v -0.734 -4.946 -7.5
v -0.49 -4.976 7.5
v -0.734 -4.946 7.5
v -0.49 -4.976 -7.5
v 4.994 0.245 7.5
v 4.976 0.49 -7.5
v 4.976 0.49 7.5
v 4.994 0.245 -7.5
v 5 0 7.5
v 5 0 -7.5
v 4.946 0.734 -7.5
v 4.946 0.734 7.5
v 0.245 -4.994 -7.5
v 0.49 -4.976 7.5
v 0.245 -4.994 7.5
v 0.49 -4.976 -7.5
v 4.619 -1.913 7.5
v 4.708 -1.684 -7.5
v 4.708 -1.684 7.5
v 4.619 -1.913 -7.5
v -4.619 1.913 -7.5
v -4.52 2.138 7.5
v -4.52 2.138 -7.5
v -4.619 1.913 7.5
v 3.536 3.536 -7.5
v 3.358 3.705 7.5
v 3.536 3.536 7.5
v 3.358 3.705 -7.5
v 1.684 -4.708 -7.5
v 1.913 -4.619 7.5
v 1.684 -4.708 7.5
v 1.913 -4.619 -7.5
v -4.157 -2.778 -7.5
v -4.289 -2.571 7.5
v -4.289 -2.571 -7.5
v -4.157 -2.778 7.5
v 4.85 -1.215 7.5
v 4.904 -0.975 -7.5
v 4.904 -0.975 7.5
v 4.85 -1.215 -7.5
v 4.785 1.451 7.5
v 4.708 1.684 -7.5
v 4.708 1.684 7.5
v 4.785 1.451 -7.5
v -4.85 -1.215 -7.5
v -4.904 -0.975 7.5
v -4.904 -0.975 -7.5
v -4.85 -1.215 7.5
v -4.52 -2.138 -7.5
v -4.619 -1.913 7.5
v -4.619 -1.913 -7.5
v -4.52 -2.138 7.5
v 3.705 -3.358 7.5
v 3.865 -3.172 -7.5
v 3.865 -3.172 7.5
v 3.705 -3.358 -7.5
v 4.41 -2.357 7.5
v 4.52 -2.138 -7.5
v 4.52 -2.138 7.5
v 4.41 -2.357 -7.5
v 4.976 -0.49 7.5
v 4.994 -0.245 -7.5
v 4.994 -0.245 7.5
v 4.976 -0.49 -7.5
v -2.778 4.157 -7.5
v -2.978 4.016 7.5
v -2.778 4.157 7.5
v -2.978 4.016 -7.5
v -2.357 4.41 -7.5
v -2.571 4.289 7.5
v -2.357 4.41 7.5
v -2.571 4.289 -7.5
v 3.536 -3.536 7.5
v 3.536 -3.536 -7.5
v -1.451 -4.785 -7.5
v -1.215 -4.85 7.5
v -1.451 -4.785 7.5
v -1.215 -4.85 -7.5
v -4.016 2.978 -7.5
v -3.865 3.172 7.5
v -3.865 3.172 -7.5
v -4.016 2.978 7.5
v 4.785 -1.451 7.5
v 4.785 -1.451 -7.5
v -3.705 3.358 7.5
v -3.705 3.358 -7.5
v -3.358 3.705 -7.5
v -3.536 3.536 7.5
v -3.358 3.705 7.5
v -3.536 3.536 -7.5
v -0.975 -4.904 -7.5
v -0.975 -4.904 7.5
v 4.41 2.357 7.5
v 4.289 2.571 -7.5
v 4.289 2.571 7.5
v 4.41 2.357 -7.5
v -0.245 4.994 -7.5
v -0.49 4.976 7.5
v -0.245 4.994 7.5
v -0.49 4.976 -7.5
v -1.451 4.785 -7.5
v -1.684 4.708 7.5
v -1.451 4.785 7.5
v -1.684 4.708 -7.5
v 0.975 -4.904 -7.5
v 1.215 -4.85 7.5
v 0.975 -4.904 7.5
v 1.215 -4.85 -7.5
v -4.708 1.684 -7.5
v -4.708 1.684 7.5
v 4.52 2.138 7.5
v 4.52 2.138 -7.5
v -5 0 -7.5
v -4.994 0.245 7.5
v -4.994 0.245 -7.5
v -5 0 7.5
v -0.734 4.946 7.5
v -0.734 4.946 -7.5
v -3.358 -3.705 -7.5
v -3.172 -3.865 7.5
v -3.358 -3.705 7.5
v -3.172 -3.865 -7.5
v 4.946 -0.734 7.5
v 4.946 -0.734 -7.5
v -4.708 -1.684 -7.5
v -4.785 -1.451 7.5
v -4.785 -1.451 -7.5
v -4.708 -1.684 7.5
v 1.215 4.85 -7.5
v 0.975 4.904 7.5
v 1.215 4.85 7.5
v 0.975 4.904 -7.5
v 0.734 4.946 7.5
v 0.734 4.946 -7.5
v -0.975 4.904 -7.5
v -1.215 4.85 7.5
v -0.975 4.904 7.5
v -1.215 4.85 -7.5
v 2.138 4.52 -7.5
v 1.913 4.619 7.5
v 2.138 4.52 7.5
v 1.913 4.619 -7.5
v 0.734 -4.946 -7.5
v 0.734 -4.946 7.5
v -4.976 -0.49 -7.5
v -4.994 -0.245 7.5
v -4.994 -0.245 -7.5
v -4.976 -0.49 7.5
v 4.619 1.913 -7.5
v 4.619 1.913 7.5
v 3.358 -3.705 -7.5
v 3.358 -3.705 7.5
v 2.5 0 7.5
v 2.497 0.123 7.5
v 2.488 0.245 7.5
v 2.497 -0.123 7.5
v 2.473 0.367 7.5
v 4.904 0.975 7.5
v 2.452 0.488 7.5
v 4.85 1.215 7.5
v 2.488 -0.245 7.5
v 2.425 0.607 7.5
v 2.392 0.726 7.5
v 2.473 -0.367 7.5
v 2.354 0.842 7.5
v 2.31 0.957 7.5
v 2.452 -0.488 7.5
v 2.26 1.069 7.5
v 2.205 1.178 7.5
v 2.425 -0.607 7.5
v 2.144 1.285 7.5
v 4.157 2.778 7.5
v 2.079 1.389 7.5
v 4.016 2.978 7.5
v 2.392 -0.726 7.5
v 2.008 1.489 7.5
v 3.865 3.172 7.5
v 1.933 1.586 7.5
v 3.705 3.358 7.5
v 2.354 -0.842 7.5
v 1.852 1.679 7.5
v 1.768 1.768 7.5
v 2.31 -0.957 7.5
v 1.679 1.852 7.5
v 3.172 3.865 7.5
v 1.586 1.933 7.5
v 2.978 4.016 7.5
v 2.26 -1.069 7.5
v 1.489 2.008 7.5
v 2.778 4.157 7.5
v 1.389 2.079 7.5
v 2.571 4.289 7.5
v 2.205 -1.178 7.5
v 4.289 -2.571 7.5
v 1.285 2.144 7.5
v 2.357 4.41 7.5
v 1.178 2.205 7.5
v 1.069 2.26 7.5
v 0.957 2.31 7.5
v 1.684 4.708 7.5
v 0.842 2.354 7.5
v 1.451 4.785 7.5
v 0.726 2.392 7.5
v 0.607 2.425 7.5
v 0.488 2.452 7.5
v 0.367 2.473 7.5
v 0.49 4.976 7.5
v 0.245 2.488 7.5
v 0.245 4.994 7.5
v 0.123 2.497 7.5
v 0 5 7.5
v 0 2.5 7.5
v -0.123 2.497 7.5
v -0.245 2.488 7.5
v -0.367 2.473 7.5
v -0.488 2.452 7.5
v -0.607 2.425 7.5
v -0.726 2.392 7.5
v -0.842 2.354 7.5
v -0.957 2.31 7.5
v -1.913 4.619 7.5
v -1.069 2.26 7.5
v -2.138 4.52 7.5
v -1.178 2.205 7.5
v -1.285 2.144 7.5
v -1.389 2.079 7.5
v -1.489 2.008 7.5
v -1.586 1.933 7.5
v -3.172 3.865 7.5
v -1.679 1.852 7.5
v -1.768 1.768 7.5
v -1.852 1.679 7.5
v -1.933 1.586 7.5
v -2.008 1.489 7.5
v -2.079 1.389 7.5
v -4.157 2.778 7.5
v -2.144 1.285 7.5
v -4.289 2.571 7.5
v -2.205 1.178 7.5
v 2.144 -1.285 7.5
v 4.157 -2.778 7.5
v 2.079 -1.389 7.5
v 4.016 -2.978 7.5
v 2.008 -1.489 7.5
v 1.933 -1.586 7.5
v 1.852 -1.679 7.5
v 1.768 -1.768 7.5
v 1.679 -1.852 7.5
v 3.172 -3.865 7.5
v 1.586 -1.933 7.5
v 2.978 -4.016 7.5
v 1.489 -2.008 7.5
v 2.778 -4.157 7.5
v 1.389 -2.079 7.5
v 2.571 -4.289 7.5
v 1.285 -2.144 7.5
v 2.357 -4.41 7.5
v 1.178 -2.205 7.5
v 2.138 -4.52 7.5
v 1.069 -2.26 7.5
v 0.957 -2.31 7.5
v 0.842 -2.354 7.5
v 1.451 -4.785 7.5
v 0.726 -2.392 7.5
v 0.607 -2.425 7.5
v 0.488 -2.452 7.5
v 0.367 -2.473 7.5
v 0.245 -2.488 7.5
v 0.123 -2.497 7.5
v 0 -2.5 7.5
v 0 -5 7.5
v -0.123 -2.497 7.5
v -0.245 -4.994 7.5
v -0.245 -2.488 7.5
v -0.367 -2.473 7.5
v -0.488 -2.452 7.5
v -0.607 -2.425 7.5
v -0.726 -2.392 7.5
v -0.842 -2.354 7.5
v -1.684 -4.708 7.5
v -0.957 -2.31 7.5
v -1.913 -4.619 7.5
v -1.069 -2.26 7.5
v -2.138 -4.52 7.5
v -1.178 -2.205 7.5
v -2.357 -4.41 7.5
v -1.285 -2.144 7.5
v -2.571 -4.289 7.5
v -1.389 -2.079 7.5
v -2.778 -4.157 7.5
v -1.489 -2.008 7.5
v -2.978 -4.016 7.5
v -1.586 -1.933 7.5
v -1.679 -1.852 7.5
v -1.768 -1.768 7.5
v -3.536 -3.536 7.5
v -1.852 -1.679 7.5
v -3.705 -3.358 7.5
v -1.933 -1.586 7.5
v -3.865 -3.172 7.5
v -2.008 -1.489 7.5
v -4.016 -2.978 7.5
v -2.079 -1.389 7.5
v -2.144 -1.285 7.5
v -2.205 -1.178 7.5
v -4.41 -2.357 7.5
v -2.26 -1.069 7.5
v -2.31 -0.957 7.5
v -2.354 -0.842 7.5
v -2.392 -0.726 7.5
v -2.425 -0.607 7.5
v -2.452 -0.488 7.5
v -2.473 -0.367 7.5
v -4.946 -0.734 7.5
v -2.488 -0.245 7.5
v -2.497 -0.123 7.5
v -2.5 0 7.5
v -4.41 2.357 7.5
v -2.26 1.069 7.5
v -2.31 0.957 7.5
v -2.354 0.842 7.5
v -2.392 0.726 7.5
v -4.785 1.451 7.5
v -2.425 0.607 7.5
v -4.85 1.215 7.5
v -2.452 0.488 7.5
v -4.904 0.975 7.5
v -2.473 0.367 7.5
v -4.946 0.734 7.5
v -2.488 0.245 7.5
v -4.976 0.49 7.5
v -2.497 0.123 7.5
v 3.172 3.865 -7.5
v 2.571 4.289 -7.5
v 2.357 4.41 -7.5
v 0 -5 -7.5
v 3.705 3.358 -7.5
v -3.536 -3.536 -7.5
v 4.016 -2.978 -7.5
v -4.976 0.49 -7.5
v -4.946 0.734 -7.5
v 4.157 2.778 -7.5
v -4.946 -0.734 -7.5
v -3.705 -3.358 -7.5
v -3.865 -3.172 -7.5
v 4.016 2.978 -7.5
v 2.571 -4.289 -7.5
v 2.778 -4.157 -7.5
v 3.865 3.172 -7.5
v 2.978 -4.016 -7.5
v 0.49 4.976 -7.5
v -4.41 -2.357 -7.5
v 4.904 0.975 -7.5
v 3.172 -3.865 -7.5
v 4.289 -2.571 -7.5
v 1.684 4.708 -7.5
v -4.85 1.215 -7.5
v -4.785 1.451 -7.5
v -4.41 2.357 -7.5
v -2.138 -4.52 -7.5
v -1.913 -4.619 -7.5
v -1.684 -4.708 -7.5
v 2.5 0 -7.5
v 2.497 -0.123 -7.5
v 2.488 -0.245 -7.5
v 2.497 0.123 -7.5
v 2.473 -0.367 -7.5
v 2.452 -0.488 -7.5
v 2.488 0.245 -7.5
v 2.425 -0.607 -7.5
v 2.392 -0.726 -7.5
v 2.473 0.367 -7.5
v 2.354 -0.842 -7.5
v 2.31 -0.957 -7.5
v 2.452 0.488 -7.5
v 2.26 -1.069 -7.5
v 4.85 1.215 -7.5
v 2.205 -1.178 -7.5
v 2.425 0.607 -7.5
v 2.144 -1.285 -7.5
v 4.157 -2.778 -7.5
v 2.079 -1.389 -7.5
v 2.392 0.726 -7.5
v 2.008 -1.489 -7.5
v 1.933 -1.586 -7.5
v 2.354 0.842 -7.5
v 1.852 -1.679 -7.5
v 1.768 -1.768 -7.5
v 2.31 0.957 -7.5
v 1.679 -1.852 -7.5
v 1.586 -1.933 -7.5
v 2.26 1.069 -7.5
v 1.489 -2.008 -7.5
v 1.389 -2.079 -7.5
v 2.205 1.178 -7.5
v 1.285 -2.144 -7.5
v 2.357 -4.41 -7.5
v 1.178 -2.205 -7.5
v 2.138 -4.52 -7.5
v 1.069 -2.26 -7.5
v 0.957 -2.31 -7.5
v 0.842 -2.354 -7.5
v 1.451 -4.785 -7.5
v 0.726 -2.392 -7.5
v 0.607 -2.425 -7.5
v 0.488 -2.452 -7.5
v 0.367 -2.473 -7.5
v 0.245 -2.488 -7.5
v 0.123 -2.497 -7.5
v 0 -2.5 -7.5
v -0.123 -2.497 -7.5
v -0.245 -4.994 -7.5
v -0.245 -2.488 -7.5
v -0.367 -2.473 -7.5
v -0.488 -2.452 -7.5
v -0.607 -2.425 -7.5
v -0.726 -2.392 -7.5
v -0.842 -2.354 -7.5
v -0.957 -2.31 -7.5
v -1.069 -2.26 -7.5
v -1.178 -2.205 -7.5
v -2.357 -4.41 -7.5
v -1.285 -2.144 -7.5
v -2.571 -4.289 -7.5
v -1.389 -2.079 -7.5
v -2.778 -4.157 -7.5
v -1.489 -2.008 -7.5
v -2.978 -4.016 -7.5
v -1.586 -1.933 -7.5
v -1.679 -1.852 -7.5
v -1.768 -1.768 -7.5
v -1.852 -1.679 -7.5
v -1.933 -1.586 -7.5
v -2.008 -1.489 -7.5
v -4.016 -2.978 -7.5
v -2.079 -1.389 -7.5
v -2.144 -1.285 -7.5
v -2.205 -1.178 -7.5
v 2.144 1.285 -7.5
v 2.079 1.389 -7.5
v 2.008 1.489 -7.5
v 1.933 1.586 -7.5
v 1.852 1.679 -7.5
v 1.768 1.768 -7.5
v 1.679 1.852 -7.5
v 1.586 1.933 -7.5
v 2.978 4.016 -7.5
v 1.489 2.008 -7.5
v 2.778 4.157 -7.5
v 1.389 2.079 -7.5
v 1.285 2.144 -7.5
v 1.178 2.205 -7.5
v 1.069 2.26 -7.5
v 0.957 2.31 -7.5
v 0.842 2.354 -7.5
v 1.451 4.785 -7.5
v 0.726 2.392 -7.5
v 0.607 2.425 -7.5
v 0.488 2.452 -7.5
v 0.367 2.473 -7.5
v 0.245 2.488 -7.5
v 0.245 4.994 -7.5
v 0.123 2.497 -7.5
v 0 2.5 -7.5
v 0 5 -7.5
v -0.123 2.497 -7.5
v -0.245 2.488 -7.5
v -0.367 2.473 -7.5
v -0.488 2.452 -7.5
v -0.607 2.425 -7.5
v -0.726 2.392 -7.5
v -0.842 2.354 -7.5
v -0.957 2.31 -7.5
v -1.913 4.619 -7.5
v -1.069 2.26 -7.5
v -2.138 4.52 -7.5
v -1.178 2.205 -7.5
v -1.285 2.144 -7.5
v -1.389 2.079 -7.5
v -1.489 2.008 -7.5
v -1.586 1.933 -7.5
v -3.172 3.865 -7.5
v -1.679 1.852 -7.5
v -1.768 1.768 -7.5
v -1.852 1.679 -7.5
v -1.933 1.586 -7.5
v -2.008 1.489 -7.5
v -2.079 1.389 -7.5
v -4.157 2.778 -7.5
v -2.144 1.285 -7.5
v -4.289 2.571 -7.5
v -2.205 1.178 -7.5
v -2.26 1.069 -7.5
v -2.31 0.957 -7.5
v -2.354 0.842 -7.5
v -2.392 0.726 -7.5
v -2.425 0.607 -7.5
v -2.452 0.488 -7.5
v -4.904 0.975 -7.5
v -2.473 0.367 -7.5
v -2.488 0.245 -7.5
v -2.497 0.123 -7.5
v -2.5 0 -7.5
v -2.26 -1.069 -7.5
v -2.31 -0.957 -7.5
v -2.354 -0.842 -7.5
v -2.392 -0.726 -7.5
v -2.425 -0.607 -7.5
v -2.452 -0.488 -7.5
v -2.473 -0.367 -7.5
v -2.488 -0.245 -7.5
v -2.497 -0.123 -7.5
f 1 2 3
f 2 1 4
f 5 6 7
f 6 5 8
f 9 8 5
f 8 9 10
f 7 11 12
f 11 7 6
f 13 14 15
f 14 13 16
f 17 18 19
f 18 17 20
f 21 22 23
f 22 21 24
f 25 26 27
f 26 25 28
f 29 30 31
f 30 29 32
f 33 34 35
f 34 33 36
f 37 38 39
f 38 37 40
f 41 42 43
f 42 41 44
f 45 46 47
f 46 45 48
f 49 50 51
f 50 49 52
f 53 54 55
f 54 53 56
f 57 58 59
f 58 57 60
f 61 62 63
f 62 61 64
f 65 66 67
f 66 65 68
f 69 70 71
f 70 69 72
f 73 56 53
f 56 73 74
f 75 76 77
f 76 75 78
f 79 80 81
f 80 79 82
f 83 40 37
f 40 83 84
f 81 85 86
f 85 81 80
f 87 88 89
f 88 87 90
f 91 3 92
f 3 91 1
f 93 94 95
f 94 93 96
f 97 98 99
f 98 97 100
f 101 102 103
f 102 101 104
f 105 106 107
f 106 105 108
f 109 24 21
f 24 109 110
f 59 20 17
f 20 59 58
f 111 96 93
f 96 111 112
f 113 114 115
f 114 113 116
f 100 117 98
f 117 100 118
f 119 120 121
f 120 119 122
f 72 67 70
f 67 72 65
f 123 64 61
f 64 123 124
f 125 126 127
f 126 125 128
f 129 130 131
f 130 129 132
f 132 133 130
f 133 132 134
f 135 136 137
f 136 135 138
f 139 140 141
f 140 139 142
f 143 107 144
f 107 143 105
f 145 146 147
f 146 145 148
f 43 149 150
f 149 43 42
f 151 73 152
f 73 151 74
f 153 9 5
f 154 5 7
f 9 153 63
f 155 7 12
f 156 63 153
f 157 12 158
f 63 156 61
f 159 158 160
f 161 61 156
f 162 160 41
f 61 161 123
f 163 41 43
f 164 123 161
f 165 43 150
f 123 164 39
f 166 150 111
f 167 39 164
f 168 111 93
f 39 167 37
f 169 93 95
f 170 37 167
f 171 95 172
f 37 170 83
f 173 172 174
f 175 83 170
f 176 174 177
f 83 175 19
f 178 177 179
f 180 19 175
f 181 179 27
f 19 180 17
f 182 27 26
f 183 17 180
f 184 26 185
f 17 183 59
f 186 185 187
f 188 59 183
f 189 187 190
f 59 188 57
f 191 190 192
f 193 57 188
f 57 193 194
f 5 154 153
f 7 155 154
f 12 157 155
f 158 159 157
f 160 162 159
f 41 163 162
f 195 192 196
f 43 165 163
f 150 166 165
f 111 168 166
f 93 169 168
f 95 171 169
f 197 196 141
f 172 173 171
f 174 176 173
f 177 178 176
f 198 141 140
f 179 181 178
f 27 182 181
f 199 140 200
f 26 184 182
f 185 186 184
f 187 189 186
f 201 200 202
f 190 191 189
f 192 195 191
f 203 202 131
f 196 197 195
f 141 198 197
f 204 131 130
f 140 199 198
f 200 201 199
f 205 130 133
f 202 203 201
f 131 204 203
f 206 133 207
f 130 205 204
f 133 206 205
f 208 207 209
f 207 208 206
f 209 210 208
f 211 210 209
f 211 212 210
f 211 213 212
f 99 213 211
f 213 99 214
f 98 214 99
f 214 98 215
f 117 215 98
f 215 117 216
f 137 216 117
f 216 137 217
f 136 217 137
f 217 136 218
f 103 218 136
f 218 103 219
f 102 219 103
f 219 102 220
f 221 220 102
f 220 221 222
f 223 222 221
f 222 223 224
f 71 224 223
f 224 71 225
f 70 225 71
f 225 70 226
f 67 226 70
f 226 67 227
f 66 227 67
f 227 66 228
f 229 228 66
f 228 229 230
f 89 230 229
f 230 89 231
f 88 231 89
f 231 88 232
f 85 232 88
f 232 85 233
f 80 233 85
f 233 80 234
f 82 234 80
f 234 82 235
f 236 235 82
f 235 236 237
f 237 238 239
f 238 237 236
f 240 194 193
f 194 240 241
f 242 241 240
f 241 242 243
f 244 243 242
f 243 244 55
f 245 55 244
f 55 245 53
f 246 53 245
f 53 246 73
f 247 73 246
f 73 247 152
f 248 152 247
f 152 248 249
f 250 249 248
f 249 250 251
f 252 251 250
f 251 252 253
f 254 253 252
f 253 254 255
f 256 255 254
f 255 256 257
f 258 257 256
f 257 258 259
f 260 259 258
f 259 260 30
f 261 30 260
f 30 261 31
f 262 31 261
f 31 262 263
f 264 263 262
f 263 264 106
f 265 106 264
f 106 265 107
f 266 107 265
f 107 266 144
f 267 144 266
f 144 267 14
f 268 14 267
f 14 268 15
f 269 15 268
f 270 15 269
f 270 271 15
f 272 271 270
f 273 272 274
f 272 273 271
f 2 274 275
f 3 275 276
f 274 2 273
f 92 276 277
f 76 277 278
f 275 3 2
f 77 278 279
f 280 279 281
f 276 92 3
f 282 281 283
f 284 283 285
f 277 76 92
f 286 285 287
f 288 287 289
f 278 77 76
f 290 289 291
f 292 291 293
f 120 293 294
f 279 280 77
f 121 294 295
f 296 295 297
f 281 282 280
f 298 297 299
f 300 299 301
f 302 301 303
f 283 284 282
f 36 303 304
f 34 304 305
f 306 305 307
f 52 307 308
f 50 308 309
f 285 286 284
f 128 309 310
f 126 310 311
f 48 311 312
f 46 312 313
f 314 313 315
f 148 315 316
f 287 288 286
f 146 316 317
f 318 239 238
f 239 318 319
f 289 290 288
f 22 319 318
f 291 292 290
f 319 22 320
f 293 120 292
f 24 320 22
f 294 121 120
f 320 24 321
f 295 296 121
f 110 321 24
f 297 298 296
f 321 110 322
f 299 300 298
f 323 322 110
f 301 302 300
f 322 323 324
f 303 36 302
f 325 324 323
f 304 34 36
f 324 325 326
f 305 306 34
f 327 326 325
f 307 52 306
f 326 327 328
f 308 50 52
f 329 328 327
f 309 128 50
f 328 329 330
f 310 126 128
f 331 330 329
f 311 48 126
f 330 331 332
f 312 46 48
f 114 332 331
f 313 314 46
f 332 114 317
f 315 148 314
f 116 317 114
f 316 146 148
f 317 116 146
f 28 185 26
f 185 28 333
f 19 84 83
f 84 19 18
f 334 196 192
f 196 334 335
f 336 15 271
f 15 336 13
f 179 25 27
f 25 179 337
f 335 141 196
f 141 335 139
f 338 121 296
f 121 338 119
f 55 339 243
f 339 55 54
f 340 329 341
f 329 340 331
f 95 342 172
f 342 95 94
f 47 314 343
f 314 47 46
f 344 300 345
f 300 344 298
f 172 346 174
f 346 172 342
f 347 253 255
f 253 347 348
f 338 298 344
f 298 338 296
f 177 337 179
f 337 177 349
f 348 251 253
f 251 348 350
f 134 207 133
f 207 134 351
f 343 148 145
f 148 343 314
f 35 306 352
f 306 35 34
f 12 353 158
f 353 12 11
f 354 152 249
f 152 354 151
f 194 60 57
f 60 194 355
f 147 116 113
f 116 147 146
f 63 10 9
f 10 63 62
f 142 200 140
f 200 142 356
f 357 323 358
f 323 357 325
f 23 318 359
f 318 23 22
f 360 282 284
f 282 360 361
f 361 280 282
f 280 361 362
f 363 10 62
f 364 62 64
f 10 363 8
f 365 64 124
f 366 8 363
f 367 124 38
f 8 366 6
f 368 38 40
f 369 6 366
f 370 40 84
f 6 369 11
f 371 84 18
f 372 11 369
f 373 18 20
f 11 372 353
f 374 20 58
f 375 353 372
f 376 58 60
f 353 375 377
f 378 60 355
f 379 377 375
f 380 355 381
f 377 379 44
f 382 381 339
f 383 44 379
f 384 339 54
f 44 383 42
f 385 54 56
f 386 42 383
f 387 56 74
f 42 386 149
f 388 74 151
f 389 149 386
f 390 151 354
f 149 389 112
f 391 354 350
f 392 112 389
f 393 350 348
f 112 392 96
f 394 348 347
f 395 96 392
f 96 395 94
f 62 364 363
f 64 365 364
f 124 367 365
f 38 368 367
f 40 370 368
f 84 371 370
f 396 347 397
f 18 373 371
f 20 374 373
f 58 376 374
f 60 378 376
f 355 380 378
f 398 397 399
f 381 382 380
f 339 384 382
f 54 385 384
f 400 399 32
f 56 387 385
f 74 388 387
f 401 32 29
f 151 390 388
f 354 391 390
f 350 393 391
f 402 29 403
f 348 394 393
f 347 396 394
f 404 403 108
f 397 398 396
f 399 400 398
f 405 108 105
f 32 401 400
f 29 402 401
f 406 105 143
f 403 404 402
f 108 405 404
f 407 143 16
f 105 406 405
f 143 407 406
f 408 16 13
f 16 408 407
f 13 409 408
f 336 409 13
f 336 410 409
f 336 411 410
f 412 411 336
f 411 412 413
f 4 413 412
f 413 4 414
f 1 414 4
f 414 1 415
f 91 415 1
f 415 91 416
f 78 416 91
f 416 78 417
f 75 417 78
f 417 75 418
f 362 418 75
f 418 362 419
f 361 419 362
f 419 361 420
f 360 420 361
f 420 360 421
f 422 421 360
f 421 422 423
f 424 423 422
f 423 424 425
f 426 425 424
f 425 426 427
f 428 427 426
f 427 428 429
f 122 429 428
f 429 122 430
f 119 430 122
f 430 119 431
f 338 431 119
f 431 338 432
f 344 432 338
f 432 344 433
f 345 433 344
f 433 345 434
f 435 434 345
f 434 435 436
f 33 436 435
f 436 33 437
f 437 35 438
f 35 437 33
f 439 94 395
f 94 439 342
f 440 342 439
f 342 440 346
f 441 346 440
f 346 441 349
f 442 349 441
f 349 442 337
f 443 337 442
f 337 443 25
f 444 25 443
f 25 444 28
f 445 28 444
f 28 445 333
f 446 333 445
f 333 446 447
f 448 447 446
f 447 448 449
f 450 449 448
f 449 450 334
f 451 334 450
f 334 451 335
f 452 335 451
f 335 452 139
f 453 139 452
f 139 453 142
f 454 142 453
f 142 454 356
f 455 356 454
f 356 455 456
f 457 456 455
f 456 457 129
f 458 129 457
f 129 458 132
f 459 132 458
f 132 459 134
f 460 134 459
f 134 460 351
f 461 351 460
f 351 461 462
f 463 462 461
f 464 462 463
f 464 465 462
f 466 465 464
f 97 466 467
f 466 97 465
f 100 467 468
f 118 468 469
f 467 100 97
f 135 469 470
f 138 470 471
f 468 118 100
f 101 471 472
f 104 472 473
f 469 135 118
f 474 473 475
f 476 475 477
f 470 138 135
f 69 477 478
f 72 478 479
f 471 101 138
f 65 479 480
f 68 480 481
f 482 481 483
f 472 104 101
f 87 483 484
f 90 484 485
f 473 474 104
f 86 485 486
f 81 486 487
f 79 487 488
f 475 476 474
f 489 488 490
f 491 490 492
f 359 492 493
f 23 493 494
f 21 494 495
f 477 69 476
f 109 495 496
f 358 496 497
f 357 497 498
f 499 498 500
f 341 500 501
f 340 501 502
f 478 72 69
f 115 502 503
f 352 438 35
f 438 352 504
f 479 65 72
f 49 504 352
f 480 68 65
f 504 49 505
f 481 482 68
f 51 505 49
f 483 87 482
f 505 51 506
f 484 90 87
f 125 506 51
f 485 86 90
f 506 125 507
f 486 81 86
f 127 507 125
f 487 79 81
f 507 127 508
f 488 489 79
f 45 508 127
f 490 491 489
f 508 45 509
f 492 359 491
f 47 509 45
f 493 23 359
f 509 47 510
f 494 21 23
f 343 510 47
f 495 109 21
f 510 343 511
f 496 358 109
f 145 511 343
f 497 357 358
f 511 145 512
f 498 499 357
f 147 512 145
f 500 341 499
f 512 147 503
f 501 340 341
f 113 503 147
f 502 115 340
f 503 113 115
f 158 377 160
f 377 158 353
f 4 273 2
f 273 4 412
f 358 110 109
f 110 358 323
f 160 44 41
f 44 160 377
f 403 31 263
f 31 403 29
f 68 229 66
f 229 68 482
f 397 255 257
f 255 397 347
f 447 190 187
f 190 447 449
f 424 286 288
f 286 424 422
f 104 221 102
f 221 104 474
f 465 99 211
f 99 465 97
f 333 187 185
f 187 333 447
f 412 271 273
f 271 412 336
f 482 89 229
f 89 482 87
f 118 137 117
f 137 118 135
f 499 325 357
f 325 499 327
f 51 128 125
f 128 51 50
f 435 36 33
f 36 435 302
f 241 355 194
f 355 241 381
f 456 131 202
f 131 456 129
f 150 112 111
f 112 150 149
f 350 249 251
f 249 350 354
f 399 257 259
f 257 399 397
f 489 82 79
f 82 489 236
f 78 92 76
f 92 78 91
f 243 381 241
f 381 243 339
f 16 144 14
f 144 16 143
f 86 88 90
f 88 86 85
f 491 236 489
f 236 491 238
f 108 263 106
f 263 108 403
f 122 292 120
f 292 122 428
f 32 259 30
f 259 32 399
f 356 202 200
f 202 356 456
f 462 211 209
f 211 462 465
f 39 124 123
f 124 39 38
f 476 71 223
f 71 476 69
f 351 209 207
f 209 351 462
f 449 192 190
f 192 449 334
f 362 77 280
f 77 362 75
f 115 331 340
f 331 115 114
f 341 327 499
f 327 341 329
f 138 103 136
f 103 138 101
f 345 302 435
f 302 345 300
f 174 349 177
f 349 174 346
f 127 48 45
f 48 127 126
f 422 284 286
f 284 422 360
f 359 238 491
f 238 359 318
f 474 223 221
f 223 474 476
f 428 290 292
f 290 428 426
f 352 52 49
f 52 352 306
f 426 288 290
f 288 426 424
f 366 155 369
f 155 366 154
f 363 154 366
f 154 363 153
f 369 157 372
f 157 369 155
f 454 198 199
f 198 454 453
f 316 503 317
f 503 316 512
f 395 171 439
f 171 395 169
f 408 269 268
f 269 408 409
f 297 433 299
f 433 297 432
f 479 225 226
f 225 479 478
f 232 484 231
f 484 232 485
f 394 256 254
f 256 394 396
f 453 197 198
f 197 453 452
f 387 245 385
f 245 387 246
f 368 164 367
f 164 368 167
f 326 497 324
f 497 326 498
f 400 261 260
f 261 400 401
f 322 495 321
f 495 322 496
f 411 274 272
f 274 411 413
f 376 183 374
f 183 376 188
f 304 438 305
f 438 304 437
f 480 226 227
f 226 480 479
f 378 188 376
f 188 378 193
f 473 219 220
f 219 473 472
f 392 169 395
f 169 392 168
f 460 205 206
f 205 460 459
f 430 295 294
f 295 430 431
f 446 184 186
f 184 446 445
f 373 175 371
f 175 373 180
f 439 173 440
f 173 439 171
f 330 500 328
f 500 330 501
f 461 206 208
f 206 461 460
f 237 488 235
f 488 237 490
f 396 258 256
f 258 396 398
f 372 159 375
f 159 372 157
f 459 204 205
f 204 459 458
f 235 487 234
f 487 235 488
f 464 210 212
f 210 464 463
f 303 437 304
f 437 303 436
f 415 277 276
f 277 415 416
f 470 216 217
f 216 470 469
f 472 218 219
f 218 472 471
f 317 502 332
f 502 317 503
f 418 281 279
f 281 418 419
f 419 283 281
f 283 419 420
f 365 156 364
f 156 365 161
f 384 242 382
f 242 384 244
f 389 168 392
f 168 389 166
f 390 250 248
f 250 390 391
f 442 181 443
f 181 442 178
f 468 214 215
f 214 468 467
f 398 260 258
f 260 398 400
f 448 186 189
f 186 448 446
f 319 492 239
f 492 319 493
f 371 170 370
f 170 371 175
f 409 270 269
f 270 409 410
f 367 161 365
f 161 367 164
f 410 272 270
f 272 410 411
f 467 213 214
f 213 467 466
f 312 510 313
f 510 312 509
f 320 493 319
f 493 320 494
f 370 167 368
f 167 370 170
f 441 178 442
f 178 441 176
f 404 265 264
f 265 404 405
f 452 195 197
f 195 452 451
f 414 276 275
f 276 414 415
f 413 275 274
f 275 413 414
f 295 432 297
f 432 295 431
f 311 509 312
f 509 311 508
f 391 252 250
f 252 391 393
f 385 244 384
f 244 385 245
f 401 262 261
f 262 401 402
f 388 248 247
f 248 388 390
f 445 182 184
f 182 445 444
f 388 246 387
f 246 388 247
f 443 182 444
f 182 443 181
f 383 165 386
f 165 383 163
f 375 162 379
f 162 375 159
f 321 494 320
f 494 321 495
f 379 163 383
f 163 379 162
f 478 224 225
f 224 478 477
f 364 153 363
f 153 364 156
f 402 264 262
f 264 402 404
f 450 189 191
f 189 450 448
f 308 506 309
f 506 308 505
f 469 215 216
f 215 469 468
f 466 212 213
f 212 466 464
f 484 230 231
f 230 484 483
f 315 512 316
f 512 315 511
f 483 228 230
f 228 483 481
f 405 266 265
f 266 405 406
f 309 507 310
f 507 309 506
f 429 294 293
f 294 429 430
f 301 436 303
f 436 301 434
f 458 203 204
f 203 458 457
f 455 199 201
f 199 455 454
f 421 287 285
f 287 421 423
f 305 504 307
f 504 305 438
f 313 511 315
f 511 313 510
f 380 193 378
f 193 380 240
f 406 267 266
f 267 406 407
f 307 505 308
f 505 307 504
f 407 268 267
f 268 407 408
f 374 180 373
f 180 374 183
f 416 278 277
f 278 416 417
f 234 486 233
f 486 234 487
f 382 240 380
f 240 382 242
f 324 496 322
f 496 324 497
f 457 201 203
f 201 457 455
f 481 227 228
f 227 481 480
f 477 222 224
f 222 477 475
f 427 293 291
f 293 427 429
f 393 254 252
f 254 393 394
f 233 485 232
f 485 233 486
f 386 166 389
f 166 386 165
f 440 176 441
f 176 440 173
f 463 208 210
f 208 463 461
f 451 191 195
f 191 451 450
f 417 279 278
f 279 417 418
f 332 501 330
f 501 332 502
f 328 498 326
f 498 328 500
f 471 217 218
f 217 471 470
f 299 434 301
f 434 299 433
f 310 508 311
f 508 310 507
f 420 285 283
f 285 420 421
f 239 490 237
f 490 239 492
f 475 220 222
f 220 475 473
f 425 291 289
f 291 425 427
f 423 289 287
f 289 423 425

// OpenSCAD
$fn = 128;

bore_d = 5.0;   // mm
od_d   = 10.0;  // mm
len    = 15.0;  // mm

eps = 0.05;     // small overlap to ensure clean boolean

// Linear bearing: hollow cylinder (annulus) with through-bore
difference() {
    cylinder(d = od_d, h = len, center = true);
    translate([0, 0, 0])
        cylinder(d = bore_d, h = len + 2*eps, center = true);
}
